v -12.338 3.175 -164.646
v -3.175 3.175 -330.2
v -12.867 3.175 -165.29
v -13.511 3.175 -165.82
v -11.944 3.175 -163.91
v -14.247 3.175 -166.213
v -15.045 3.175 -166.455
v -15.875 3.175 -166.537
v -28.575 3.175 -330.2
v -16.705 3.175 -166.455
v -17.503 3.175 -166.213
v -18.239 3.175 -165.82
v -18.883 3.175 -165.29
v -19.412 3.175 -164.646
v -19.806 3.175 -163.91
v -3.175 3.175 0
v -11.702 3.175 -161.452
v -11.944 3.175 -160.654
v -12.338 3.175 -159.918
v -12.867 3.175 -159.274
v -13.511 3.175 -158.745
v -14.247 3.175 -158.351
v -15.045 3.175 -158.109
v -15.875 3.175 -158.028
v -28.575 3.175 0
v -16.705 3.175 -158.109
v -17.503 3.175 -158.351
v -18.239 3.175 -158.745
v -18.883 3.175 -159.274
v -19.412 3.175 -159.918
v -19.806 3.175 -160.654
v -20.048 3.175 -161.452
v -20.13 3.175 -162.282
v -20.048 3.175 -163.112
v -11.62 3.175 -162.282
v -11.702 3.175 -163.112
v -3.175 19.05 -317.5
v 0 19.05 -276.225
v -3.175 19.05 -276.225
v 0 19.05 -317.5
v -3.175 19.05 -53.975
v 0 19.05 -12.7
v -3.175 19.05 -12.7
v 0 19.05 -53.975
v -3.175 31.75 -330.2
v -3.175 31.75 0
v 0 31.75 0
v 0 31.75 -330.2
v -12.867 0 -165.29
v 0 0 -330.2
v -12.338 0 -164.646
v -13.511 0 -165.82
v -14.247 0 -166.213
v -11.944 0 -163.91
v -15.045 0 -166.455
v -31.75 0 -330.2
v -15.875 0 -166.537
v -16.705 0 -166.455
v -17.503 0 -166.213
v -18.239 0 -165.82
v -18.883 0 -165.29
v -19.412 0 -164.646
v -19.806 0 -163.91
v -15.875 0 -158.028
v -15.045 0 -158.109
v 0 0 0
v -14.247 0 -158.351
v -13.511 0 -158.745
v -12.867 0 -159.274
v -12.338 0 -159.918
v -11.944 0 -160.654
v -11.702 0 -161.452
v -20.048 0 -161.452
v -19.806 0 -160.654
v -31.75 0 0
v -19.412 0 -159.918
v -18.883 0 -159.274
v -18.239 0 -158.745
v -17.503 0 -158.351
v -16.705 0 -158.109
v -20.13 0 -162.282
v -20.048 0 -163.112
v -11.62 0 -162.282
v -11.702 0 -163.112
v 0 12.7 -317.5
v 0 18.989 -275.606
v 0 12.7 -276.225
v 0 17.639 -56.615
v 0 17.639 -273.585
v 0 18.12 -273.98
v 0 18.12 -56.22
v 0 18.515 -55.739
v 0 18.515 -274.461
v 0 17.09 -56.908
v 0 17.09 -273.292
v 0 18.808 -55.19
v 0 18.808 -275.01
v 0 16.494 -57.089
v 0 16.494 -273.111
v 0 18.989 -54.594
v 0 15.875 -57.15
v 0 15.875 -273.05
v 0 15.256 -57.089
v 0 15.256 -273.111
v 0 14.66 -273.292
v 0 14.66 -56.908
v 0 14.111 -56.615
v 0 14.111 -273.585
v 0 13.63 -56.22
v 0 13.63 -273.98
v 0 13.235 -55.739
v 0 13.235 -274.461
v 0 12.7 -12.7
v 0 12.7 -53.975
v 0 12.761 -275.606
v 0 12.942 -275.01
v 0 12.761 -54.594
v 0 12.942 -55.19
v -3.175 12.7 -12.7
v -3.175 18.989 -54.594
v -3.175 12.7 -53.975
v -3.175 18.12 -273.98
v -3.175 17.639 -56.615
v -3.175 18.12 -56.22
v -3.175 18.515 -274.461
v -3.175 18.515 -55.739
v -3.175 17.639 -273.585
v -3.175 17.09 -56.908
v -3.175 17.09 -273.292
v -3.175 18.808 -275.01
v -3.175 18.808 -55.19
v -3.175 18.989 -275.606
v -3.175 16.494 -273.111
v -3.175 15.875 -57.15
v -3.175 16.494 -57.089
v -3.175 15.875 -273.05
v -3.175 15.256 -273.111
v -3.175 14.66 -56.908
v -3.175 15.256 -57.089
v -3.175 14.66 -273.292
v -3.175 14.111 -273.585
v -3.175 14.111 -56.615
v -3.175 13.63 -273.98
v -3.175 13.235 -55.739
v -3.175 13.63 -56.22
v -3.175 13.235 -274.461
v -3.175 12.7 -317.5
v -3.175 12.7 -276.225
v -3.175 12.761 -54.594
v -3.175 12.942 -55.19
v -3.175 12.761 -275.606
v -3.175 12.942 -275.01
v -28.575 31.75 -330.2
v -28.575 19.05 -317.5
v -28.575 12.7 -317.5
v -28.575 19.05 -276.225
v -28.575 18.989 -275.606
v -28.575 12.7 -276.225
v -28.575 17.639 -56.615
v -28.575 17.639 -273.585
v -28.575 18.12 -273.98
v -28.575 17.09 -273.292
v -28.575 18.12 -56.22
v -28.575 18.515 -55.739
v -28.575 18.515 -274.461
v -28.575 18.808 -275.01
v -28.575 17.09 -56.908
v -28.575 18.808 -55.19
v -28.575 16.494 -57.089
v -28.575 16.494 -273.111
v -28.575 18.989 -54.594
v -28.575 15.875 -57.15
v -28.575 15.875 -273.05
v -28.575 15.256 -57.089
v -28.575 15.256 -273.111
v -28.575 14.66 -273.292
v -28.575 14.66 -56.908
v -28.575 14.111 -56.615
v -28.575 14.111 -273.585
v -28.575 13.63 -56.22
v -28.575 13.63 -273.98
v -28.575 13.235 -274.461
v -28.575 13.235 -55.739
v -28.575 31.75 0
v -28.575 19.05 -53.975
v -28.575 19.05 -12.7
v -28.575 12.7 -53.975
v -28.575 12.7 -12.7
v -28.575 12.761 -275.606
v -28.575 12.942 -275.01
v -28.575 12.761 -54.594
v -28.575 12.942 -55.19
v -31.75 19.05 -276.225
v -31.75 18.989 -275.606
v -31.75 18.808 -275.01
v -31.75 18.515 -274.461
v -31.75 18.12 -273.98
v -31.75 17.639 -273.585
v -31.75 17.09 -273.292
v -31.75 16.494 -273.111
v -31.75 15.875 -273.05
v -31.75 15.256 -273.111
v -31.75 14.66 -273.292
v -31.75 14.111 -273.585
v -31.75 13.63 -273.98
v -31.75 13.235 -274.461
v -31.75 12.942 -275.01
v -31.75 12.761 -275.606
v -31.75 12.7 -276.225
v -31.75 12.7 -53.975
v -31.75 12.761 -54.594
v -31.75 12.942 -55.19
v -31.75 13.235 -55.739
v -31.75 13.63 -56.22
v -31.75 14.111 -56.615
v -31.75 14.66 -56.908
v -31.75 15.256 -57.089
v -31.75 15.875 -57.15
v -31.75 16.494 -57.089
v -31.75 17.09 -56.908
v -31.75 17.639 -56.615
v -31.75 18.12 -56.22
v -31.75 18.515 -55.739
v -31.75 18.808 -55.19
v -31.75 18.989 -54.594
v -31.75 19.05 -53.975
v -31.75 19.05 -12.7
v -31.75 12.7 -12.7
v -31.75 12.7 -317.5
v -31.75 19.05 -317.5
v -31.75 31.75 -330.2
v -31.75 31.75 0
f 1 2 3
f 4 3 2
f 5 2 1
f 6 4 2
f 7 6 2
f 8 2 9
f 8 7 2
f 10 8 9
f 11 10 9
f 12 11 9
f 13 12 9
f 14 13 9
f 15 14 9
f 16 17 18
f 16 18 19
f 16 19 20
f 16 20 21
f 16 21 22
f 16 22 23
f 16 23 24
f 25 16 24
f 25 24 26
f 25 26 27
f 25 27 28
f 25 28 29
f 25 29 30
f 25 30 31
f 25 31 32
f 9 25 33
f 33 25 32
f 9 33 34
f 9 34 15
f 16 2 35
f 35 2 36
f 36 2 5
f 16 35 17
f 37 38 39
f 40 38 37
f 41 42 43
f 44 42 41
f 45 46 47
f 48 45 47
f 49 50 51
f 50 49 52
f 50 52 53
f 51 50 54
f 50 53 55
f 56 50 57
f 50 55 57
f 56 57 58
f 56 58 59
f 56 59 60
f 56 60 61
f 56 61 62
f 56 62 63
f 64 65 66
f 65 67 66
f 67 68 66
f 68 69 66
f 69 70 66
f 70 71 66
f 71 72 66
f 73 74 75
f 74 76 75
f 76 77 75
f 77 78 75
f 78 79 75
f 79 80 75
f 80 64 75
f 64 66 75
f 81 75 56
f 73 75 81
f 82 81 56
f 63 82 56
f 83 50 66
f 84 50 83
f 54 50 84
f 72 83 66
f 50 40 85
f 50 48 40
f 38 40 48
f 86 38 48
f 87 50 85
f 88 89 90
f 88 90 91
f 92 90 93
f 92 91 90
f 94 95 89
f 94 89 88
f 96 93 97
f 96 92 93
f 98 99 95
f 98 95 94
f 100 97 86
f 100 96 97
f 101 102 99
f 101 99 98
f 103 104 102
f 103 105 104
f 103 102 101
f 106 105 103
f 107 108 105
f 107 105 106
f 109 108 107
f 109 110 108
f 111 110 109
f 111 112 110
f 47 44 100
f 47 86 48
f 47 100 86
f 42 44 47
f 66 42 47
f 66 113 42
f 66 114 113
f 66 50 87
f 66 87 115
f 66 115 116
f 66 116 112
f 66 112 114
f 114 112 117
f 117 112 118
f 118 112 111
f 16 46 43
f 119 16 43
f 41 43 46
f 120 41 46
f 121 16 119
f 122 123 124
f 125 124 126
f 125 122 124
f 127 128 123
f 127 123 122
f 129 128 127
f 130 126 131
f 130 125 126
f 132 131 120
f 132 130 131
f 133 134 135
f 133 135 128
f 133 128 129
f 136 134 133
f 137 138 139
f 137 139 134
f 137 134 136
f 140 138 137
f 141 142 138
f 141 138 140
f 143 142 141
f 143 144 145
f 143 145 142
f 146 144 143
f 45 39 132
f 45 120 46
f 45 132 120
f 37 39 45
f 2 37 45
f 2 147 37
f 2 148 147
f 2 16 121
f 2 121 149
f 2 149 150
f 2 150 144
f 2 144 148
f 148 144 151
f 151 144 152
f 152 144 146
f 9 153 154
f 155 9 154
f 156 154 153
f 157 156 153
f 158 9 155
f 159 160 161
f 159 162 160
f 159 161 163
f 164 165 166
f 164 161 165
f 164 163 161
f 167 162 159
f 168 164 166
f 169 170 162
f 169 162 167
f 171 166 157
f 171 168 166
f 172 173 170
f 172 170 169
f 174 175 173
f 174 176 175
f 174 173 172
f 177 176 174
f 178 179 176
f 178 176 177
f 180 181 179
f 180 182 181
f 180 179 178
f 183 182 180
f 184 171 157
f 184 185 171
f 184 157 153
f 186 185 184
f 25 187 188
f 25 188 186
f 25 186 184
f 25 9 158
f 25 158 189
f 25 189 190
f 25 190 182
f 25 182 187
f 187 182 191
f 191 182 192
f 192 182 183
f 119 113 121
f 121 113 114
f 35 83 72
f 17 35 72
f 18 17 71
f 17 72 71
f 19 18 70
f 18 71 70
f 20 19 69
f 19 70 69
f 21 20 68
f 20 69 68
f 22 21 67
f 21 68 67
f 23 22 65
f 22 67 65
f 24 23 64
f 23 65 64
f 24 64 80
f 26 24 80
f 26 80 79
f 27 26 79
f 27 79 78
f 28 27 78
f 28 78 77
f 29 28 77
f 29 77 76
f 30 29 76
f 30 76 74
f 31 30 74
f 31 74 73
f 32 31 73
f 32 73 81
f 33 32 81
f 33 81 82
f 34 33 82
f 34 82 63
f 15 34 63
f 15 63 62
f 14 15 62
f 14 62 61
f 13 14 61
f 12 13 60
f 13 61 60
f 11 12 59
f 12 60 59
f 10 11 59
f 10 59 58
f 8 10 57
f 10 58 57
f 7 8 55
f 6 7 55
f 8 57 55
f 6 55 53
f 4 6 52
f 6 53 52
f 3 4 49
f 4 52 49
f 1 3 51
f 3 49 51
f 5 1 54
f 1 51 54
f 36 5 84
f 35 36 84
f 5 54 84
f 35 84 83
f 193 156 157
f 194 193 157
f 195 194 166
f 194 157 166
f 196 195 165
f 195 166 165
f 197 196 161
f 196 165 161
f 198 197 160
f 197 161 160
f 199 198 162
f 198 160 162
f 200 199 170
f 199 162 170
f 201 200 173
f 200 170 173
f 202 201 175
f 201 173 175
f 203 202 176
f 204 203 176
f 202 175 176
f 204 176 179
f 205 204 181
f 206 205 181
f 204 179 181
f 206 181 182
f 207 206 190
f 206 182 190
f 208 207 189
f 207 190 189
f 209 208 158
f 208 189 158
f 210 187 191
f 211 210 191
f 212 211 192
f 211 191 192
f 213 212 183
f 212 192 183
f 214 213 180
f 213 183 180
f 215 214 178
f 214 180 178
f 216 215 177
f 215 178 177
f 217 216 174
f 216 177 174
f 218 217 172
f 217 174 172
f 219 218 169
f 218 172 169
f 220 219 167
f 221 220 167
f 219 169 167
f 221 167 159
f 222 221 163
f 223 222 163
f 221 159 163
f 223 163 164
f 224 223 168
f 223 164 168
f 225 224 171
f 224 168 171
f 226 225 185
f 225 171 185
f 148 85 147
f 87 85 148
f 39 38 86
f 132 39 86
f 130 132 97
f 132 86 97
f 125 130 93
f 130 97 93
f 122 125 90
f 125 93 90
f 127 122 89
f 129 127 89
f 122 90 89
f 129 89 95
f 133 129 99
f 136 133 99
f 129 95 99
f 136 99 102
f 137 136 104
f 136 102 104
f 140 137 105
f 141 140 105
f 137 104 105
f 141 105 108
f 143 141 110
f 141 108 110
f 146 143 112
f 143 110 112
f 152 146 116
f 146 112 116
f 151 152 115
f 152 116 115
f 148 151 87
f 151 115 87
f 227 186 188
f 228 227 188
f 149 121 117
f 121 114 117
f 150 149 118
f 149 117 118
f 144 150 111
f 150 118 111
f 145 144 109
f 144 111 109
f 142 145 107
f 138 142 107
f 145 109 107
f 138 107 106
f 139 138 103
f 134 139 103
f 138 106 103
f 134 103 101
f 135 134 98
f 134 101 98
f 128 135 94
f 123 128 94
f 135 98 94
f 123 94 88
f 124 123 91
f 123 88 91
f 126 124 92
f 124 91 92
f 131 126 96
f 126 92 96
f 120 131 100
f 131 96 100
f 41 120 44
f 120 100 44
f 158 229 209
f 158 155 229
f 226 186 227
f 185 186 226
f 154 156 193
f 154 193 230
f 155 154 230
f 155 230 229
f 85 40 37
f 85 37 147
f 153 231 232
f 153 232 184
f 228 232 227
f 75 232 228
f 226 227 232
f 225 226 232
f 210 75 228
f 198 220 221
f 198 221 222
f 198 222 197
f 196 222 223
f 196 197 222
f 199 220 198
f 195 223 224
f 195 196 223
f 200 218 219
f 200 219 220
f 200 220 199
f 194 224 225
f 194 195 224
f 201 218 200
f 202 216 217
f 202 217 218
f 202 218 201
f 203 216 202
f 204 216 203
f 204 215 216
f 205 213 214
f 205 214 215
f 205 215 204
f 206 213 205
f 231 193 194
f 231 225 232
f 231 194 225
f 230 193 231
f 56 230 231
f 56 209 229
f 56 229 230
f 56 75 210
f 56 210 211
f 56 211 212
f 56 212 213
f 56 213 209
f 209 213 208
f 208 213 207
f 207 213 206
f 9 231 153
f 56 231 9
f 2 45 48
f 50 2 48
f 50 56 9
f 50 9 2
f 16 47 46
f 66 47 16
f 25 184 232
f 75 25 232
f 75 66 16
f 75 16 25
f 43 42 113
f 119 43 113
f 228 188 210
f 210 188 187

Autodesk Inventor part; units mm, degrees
ref_plane "YZ Plane" through (0, 0, 0) normal (1, 0, 0) x (0, 1, 0)
ref_plane "XZ Plane" through (0, 0, 0) normal (0, 1, 0) x (-1, 0, 0)
ref_plane "XY Plane" through (0, 0, 0) normal (0, 0, 1) x (1, 0, 0)
sketch "Sketch1" plane through (0, 0, 0) normal (0, 1, 0) x (-1, 0, 0)
  line L0 (0, 0) -> (31.75, 0)
  line L1 (31.75, 0) -> (31.75, -330.2)
  line L2 (31.75, -330.2) -> (0, -330.2)
  line L3 (0, -330.2) -> (0, 0)
  dimension "d0" = 31.75
  dimension "d1" = 330.2
extrude "Extrusion1" add sketch "Sketch1" along normal blind 3.175
sketch "Sketch8" plane through (0, 3.175, 0) normal (0, 1, 0) x (1, 0, 0)
  line L0 (-31.75, 330.2) -> (-31.75, 0) projected
  line L1 (-31.75, 0) -> (-28.575, 0)
  line L2 (-31.75, 0) -> (0, 0) projected
  line L3 (0, 0) -> (-3.175, 0)
  line L4 (-3.175, 0) -> (-3.175, 330.2)
  line L5 (0, 330.2) -> (-31.75, 330.2) projected
  line L6 (-3.175, 330.2) -> (0, 330.2)
  line L7 (-31.75, 330.2) -> (-28.575, 330.2)
  line L8 (-28.575, 330.2) -> (-28.575, 0)
  line L9 (0, 0) -> (0, 330.2)
  dimension "d41" = 3.175
  dimension "d42" = 3.175
extrude "Extrusion7" add sketch "Sketch8" along normal blind 28.575 contours L5 L8 L1 L0 | L5 L9 L2 L4
sketch "Sketch10" plane through (0, 0, 0) normal (0, -1, 0) x (1, 0, 0)
  line L0 (0, 0) -> (-31.75, 0) projected
  line L1 (-3.175, -330.2) -> (-28.575, -330.2) projected
  line L2 (0, -330.2) -> (0, 0) projected
  line L3 (-31.75, 0) -> (-31.75, -330.2) projected
  circle A0 centre (-15.875, -162.2821) radius 4.2545
  line L4 (0, -162.2821) -> (-31.75, -162.2821)
  dimension "d60" = 8.509
extrude "Extrusion11" cut sketch "Sketch10" against normal through all contours L4 A0 | A0 L4
sketch "Sketch12" plane through (0, 0, 0) normal (1, 0, 0) x (0, 0, -1)
  line L0 (0, 0) -> (0, 31.75) projected
  line L1 (330.2, 3.175) -> (330.2, 31.75) projected
  line L2 (330.2, 31.75) -> (0, 31.75) projected
  line L3 (330.2, 0) -> (0, 0) projected
  line L4 (12.7, 19.05) -> (12.7, 12.7)
  arc A0 (53.975, 12.7) -> (53.975, 19.05) centre (53.975, 15.875) ccw
  line L5 (12.7, 19.05) -> (53.975, 19.05)
  line L6 (12.7, 12.7) -> (53.975, 12.7)
  line L7 (317.5, 19.05) -> (317.5, 12.7)
  arc A1 (276.225, 19.05) -> (276.225, 12.7) centre (276.225, 15.875) ccw
  line L8 (276.225, 19.05) -> (317.5, 19.05)
  line L9 (317.5, 12.7) -> (276.225, 12.7)
extrude "Extrusion13" cut sketch "Sketch12" against normal through all
properties part number "Teemoverthing" material "Aluminum 6061"
